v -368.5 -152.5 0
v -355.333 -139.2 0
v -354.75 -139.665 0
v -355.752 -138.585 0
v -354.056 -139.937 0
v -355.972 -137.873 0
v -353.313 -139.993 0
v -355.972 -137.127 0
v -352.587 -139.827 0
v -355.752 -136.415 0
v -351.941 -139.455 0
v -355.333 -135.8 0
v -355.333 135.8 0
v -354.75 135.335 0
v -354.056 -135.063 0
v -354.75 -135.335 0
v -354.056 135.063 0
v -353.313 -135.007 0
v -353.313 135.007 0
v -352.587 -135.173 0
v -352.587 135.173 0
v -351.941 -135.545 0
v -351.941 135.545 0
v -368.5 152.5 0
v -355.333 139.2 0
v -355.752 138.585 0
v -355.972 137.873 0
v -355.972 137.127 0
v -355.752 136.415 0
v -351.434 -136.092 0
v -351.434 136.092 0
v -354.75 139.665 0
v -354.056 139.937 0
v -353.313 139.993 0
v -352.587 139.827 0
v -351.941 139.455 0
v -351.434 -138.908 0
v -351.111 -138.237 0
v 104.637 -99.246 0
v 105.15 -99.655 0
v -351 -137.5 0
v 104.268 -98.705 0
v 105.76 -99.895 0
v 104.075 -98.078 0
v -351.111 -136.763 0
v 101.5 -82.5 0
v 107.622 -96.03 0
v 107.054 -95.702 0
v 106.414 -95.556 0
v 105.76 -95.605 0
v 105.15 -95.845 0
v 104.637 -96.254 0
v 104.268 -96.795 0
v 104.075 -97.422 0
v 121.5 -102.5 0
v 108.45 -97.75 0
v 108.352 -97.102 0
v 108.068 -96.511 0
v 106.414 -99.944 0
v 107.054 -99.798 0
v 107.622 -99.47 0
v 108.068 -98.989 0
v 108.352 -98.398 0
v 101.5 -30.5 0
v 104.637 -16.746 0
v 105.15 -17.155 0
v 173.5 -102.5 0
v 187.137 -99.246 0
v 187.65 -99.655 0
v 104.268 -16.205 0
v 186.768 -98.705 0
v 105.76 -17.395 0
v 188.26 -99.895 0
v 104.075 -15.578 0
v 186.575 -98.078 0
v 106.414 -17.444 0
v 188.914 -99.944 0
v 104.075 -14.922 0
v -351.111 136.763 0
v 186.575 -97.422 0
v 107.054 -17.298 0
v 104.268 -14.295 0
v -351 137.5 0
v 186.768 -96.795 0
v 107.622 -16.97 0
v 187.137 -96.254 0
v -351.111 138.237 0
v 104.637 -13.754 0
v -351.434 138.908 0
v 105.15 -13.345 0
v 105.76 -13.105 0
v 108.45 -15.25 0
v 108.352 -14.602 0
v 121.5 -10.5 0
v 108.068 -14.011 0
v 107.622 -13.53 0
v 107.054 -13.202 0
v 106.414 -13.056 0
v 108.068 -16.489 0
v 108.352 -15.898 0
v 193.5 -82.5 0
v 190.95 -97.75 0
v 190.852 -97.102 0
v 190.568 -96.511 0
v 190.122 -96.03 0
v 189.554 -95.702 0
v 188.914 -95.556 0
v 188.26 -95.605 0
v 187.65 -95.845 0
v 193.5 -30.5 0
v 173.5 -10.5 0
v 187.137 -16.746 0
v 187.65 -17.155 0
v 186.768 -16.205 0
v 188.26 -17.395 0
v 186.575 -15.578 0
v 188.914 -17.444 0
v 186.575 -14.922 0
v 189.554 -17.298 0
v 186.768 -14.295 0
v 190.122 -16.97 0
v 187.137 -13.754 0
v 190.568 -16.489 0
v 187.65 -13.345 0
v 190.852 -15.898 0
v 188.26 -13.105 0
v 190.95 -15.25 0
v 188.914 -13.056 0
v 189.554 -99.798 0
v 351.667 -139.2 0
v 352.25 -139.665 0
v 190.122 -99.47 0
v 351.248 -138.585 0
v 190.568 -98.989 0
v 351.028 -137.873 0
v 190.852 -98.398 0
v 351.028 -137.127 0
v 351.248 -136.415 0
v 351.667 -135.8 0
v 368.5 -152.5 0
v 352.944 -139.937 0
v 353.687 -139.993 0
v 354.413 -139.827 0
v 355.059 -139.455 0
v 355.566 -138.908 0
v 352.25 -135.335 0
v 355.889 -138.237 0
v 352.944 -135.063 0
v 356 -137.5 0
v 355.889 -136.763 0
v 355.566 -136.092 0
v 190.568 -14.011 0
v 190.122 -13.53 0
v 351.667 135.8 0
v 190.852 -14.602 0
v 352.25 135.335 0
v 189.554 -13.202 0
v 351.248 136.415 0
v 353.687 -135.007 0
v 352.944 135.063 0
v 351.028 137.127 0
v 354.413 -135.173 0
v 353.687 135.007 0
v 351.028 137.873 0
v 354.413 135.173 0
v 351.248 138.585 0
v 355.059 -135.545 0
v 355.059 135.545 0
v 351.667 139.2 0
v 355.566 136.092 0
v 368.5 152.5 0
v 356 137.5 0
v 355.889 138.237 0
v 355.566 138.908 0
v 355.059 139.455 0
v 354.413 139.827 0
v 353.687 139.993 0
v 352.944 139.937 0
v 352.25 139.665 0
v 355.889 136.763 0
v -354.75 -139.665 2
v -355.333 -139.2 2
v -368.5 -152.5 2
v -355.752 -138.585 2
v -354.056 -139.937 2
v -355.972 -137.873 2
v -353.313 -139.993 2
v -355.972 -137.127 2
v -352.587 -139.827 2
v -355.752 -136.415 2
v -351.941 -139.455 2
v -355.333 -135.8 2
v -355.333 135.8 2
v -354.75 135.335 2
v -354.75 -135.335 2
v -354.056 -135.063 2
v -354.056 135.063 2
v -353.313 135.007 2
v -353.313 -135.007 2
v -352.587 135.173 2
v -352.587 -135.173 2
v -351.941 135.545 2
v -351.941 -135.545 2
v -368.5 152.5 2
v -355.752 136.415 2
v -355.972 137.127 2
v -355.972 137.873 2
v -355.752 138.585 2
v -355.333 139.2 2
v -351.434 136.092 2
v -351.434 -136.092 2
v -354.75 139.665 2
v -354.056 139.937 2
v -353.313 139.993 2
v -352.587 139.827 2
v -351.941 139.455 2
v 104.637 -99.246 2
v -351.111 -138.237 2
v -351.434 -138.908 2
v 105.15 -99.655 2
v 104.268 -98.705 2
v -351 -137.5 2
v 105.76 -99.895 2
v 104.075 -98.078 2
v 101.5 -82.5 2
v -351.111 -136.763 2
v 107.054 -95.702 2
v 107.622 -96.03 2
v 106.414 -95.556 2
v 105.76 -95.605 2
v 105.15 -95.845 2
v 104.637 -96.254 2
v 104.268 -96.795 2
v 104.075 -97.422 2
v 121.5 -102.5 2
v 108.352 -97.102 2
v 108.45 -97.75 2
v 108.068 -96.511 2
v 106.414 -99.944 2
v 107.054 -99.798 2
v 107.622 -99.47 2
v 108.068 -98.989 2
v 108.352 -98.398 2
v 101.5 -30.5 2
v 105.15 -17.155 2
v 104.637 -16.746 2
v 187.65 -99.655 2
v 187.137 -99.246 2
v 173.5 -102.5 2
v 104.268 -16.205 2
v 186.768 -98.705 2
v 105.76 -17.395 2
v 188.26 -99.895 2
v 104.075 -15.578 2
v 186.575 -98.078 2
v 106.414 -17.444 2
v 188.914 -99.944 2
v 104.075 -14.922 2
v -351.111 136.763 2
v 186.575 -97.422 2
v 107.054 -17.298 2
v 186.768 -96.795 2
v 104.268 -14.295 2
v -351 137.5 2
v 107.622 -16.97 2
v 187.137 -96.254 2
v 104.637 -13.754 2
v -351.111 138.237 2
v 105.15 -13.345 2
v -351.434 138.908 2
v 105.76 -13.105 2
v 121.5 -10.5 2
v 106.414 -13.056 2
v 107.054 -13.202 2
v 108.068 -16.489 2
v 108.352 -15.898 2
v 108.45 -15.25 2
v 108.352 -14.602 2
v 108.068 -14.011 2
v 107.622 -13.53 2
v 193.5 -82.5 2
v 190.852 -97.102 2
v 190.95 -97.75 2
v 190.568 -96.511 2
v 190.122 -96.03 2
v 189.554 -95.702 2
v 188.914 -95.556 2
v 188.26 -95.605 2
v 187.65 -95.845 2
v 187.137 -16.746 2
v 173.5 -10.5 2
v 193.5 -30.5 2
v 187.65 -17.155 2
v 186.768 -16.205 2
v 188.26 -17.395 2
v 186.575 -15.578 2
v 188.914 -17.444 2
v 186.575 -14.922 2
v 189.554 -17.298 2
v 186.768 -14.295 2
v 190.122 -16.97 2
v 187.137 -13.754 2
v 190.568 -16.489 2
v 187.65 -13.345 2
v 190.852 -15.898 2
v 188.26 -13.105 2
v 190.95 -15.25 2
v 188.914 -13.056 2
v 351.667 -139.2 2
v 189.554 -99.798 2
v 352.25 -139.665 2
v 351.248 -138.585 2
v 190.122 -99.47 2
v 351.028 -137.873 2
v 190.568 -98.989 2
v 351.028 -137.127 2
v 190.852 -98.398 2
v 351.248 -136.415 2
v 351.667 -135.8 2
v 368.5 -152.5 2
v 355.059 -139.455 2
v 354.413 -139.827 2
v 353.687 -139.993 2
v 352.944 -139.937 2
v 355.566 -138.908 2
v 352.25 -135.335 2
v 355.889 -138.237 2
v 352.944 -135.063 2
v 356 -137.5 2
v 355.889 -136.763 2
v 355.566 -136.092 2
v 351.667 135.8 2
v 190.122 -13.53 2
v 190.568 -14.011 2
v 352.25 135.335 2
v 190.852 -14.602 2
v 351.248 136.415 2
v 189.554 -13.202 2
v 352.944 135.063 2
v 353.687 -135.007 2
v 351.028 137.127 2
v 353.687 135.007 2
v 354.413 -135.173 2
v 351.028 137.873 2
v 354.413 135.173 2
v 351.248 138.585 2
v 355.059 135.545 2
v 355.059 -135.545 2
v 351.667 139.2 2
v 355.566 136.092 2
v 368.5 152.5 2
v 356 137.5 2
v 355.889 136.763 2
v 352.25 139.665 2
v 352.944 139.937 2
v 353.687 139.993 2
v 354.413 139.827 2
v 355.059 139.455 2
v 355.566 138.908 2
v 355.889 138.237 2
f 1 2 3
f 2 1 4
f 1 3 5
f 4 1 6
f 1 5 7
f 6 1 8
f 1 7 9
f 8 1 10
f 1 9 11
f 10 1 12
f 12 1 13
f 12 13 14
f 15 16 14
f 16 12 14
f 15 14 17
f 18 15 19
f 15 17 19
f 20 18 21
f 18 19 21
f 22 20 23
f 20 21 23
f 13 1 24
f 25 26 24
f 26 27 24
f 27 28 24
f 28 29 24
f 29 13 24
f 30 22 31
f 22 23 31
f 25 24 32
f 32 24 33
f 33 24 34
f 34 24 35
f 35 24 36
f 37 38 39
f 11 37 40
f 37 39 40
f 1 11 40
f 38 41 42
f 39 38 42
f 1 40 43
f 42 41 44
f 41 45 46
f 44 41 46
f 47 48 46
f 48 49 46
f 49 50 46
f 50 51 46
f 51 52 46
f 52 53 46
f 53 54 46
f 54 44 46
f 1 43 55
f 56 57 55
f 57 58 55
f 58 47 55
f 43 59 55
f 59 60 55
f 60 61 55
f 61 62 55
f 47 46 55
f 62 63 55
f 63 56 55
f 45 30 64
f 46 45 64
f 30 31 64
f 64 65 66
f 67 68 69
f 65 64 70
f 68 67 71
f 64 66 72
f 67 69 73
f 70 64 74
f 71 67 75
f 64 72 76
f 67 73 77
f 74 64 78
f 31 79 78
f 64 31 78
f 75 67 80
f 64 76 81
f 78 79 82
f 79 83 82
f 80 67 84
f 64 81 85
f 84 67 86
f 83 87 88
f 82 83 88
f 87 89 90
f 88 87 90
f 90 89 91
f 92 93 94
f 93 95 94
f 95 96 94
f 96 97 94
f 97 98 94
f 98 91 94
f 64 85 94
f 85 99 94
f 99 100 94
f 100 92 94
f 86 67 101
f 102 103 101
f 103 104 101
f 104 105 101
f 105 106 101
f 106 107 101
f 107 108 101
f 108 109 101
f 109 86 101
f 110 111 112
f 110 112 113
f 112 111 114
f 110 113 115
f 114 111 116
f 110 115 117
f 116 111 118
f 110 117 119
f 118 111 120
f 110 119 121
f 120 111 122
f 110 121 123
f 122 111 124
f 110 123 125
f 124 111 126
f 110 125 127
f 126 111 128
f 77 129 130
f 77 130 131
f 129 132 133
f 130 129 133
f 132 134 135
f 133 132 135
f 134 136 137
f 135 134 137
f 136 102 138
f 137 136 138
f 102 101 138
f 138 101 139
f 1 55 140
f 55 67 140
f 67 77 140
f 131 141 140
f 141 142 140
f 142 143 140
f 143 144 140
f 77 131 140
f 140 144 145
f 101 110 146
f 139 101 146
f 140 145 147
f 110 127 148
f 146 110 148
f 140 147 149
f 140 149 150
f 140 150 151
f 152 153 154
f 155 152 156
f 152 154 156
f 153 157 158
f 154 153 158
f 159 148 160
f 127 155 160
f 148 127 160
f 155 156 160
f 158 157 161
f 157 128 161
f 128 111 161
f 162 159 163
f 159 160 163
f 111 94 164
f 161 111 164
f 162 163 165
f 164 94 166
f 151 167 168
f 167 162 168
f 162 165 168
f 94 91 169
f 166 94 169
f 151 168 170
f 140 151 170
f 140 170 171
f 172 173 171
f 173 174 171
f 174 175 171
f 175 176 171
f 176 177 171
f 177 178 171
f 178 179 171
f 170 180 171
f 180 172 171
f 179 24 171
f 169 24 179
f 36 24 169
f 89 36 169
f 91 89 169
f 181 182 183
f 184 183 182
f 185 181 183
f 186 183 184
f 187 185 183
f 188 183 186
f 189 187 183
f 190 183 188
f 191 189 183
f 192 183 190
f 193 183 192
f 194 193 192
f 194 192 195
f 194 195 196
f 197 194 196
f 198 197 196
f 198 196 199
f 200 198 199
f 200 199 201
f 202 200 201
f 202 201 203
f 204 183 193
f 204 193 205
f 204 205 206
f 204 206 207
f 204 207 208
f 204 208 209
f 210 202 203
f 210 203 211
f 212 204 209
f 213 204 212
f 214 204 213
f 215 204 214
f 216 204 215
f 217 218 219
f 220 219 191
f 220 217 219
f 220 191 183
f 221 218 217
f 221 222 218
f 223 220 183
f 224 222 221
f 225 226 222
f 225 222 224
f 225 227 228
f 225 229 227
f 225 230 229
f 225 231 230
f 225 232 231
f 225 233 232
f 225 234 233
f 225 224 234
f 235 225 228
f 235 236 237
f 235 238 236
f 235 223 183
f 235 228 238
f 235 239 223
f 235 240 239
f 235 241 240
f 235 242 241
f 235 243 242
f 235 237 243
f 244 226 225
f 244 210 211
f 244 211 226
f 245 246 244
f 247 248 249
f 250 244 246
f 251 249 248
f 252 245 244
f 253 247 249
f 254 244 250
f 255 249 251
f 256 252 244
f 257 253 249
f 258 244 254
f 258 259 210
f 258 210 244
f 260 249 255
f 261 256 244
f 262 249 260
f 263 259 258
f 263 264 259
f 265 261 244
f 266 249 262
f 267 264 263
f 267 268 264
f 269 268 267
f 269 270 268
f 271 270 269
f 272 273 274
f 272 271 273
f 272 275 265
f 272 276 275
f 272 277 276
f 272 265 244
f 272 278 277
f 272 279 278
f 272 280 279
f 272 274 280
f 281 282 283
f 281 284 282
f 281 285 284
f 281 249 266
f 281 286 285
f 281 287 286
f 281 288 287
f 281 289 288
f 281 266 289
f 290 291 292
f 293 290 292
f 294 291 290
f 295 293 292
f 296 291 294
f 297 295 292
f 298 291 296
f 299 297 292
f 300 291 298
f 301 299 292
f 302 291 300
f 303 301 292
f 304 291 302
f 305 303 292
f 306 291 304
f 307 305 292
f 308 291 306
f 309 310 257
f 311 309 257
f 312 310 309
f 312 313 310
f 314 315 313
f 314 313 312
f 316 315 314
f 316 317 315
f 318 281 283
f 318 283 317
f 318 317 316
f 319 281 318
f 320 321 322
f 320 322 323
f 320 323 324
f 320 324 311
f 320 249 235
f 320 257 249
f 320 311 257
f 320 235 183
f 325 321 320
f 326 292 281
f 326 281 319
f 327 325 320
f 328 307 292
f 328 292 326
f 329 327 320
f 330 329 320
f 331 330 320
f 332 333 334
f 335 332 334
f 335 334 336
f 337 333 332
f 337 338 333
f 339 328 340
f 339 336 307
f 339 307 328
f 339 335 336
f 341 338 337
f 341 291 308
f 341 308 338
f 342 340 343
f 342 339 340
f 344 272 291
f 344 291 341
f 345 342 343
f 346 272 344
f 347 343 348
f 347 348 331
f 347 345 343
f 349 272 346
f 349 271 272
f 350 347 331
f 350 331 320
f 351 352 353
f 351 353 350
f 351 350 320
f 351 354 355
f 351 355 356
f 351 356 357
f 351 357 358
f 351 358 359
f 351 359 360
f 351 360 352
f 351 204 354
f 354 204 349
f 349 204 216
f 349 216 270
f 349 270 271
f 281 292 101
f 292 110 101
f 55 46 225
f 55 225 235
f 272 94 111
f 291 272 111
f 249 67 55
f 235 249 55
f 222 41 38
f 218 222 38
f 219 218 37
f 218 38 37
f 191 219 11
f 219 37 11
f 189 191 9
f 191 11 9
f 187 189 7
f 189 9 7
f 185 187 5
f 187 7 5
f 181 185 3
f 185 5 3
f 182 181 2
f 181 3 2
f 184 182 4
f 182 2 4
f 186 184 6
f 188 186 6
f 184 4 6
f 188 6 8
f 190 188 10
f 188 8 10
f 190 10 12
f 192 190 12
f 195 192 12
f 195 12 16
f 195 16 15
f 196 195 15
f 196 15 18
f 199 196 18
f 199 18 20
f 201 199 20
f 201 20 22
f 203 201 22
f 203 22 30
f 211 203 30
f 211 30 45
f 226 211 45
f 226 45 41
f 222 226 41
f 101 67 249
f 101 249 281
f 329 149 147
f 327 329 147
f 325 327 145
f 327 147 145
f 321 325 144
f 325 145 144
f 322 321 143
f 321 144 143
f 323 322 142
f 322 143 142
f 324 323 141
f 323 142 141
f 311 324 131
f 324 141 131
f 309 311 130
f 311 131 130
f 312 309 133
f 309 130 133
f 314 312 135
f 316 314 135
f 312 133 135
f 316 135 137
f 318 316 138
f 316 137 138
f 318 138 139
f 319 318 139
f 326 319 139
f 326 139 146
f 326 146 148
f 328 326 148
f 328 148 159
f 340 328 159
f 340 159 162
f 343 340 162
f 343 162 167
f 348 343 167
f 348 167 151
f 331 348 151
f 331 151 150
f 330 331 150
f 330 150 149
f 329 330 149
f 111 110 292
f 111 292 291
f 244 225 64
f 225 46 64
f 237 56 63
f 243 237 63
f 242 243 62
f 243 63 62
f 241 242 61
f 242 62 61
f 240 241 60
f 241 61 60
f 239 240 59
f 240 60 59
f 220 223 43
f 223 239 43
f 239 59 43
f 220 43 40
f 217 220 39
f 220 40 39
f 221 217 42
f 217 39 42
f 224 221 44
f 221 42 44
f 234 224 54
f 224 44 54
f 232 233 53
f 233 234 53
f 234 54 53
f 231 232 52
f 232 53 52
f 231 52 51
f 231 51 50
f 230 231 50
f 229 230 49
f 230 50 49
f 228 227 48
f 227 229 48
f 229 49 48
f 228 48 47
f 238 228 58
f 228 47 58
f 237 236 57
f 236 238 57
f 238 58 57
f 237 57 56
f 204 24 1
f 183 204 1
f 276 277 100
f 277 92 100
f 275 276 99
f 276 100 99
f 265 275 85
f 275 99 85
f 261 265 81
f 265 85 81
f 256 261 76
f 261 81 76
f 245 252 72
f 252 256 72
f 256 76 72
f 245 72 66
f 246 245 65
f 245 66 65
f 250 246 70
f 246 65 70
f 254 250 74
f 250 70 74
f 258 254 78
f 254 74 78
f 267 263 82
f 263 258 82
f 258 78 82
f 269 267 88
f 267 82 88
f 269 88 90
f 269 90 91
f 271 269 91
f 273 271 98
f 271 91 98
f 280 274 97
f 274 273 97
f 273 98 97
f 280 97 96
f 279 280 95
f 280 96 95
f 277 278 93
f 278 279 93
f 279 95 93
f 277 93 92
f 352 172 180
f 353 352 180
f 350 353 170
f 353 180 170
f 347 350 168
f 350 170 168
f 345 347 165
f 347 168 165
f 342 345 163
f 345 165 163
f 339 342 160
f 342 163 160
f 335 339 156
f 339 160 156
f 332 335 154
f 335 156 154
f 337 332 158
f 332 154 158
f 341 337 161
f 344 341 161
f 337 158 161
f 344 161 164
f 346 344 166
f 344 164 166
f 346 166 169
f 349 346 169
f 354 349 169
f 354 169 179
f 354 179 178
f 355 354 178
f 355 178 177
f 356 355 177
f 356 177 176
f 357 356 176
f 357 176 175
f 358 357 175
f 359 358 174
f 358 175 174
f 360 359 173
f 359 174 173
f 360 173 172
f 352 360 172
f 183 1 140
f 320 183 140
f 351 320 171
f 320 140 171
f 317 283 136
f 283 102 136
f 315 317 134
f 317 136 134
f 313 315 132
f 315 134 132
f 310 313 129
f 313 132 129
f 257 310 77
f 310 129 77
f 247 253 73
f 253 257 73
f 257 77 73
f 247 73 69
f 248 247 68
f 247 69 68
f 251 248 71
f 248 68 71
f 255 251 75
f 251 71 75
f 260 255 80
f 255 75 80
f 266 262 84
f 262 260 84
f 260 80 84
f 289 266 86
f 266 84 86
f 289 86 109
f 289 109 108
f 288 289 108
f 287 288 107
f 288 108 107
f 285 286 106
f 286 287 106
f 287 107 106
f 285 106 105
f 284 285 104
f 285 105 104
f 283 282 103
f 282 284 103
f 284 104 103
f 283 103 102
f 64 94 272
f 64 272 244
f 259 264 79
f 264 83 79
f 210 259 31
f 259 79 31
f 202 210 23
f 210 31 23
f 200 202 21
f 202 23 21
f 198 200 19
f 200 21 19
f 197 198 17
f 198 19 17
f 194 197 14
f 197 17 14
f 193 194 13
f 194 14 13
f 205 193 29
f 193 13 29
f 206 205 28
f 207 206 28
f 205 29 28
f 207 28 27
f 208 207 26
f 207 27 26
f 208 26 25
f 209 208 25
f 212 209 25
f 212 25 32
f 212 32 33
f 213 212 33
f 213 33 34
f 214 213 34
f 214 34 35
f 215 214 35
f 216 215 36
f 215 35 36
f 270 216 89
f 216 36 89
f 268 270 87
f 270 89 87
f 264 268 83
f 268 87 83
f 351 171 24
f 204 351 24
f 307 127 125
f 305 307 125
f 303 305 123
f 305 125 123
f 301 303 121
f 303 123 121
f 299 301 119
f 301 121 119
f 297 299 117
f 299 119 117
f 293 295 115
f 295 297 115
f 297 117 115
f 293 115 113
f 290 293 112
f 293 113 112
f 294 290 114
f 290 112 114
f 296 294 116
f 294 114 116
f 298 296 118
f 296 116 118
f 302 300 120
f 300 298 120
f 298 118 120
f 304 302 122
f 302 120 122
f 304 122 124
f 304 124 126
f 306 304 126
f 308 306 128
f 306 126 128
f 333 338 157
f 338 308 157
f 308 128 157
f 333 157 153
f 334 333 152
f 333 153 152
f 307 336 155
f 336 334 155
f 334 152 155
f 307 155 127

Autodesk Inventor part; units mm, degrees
ref_plane "YZ Plane" through (0, 0, 0) normal (1, 0, 0) x (0, 1, 0)
ref_plane "XZ Plane" through (0, 0, 0) normal (0, 1, 0) x (-1, 0, 0)
ref_plane "XY Plane" through (0, 0, 0) normal (0, 0, 1) x (1, 0, 0)
sketch "Esquisse1" plane through (0, 0, 0) normal (0, 0, 1) x (1, 0, 0)
  line L0 (-368.5, -152.5) -> (368.5, -152.5)
  line L1 (368.5, -152.5) -> (368.5, 152.5)
  line L2 (368.5, 152.5) -> (-368.5, 152.5)
  line L3 (-368.5, 152.5) -> (-368.5, -152.5)
  line L4 (-368.5, -152.5) -> (368.5, 152.5) construction
  line L5 (-356, -140) -> (356, -140)
  line L6 (356, -140) -> (356, 140)
  line L7 (356, 140) -> (-356, 140)
  line L8 (-356, 140) -> (-356, -140)
  line L9 (-356, -140) -> (356, 140) construction
  circle A0 centre (-353.5, 137.5) radius 2.5
  circle A1 centre (-353.5, -137.5) radius 2.5
  circle A2 centre (353.5, -137.5) radius 2.5
  circle A3 centre (353.5, 137.5) radius 2.5
  line L10 (121.5, -10.5) -> (173.5, -10.5)
  line L11 (193.5, -30.5) -> (193.5, -82.5)
  line L12 (173.5, -102.5) -> (121.5, -102.5)
  line L13 (101.5, -82.5) -> (101.5, -30.5)
  line L14 (101.5, -10.5) -> (193.5, -102.5) construction
  line L15 (193.5, -10.5) -> (101.5, -102.5) construction
  line L16 (121.5, -10.5) -> (101.5, -30.5)
  line L17 (101.5, -82.5) -> (121.5, -102.5)
  line L18 (173.5, -102.5) -> (193.5, -82.5)
  line L19 (193.5, -30.5) -> (173.5, -10.5)
  circle A4 centre (106.25, -15.25) radius 2.2
  circle A5 centre (188.75, -15.25) radius 2.2
  circle A6 centre (188.75, -97.75) radius 2.2
  circle A7 centre (106.25, -97.75) radius 2.2
  point P0 (0, 0)
  point P1 (-356, -137.5)
  point P2 (-353.5, -140)
  point P3 (353.5, -140)
  point P4 (356, -137.5)
  point P5 (356, 137.5)
  point P6 (353.5, 140)
  point P7 (-356, 137.5)
  point P8 (-353.5, 140)
  point P9 (147.5, -56.5)
  dimension "d0" = 737
  dimension "d1" = 305
  dimension "d2" = 12.5
  dimension "d3" = 12.5
  dimension "d4" = 5
  dimension "d7" = 5
  dimension "d8" = 5
  dimension "d9" = 5
  dimension "d36" = 92
  dimension "d37" = 92
  dimension "d38" = 50
  dimension "d39" = 175
  dimension "d48" = 20
  dimension "d49" = 20
  dimension "d50" = 20
  dimension "d51" = 20
  dimension "d52" = 20
  dimension "d53" = 20
  dimension "d54" = 20
  dimension "d55" = 20
  dimension "d57" = 4.4
  dimension "d58" = 4.4
  dimension "d59" = 4.4
  dimension "d60" = 4.4
  dimension "d61" = 4.75
  dimension "d62" = 4.75
extrude "Extrusion1" add sketch "Esquisse1" along normal blind 2 contours L3 L2 L1 L0 | L8 A1 L5 | A1 L8 A0 L7 A3 L6 A2 L5 | A2 L6 L5 | L8 L7 A0 | A3 L7 L6
properties part number "PlaqueVentilo"
